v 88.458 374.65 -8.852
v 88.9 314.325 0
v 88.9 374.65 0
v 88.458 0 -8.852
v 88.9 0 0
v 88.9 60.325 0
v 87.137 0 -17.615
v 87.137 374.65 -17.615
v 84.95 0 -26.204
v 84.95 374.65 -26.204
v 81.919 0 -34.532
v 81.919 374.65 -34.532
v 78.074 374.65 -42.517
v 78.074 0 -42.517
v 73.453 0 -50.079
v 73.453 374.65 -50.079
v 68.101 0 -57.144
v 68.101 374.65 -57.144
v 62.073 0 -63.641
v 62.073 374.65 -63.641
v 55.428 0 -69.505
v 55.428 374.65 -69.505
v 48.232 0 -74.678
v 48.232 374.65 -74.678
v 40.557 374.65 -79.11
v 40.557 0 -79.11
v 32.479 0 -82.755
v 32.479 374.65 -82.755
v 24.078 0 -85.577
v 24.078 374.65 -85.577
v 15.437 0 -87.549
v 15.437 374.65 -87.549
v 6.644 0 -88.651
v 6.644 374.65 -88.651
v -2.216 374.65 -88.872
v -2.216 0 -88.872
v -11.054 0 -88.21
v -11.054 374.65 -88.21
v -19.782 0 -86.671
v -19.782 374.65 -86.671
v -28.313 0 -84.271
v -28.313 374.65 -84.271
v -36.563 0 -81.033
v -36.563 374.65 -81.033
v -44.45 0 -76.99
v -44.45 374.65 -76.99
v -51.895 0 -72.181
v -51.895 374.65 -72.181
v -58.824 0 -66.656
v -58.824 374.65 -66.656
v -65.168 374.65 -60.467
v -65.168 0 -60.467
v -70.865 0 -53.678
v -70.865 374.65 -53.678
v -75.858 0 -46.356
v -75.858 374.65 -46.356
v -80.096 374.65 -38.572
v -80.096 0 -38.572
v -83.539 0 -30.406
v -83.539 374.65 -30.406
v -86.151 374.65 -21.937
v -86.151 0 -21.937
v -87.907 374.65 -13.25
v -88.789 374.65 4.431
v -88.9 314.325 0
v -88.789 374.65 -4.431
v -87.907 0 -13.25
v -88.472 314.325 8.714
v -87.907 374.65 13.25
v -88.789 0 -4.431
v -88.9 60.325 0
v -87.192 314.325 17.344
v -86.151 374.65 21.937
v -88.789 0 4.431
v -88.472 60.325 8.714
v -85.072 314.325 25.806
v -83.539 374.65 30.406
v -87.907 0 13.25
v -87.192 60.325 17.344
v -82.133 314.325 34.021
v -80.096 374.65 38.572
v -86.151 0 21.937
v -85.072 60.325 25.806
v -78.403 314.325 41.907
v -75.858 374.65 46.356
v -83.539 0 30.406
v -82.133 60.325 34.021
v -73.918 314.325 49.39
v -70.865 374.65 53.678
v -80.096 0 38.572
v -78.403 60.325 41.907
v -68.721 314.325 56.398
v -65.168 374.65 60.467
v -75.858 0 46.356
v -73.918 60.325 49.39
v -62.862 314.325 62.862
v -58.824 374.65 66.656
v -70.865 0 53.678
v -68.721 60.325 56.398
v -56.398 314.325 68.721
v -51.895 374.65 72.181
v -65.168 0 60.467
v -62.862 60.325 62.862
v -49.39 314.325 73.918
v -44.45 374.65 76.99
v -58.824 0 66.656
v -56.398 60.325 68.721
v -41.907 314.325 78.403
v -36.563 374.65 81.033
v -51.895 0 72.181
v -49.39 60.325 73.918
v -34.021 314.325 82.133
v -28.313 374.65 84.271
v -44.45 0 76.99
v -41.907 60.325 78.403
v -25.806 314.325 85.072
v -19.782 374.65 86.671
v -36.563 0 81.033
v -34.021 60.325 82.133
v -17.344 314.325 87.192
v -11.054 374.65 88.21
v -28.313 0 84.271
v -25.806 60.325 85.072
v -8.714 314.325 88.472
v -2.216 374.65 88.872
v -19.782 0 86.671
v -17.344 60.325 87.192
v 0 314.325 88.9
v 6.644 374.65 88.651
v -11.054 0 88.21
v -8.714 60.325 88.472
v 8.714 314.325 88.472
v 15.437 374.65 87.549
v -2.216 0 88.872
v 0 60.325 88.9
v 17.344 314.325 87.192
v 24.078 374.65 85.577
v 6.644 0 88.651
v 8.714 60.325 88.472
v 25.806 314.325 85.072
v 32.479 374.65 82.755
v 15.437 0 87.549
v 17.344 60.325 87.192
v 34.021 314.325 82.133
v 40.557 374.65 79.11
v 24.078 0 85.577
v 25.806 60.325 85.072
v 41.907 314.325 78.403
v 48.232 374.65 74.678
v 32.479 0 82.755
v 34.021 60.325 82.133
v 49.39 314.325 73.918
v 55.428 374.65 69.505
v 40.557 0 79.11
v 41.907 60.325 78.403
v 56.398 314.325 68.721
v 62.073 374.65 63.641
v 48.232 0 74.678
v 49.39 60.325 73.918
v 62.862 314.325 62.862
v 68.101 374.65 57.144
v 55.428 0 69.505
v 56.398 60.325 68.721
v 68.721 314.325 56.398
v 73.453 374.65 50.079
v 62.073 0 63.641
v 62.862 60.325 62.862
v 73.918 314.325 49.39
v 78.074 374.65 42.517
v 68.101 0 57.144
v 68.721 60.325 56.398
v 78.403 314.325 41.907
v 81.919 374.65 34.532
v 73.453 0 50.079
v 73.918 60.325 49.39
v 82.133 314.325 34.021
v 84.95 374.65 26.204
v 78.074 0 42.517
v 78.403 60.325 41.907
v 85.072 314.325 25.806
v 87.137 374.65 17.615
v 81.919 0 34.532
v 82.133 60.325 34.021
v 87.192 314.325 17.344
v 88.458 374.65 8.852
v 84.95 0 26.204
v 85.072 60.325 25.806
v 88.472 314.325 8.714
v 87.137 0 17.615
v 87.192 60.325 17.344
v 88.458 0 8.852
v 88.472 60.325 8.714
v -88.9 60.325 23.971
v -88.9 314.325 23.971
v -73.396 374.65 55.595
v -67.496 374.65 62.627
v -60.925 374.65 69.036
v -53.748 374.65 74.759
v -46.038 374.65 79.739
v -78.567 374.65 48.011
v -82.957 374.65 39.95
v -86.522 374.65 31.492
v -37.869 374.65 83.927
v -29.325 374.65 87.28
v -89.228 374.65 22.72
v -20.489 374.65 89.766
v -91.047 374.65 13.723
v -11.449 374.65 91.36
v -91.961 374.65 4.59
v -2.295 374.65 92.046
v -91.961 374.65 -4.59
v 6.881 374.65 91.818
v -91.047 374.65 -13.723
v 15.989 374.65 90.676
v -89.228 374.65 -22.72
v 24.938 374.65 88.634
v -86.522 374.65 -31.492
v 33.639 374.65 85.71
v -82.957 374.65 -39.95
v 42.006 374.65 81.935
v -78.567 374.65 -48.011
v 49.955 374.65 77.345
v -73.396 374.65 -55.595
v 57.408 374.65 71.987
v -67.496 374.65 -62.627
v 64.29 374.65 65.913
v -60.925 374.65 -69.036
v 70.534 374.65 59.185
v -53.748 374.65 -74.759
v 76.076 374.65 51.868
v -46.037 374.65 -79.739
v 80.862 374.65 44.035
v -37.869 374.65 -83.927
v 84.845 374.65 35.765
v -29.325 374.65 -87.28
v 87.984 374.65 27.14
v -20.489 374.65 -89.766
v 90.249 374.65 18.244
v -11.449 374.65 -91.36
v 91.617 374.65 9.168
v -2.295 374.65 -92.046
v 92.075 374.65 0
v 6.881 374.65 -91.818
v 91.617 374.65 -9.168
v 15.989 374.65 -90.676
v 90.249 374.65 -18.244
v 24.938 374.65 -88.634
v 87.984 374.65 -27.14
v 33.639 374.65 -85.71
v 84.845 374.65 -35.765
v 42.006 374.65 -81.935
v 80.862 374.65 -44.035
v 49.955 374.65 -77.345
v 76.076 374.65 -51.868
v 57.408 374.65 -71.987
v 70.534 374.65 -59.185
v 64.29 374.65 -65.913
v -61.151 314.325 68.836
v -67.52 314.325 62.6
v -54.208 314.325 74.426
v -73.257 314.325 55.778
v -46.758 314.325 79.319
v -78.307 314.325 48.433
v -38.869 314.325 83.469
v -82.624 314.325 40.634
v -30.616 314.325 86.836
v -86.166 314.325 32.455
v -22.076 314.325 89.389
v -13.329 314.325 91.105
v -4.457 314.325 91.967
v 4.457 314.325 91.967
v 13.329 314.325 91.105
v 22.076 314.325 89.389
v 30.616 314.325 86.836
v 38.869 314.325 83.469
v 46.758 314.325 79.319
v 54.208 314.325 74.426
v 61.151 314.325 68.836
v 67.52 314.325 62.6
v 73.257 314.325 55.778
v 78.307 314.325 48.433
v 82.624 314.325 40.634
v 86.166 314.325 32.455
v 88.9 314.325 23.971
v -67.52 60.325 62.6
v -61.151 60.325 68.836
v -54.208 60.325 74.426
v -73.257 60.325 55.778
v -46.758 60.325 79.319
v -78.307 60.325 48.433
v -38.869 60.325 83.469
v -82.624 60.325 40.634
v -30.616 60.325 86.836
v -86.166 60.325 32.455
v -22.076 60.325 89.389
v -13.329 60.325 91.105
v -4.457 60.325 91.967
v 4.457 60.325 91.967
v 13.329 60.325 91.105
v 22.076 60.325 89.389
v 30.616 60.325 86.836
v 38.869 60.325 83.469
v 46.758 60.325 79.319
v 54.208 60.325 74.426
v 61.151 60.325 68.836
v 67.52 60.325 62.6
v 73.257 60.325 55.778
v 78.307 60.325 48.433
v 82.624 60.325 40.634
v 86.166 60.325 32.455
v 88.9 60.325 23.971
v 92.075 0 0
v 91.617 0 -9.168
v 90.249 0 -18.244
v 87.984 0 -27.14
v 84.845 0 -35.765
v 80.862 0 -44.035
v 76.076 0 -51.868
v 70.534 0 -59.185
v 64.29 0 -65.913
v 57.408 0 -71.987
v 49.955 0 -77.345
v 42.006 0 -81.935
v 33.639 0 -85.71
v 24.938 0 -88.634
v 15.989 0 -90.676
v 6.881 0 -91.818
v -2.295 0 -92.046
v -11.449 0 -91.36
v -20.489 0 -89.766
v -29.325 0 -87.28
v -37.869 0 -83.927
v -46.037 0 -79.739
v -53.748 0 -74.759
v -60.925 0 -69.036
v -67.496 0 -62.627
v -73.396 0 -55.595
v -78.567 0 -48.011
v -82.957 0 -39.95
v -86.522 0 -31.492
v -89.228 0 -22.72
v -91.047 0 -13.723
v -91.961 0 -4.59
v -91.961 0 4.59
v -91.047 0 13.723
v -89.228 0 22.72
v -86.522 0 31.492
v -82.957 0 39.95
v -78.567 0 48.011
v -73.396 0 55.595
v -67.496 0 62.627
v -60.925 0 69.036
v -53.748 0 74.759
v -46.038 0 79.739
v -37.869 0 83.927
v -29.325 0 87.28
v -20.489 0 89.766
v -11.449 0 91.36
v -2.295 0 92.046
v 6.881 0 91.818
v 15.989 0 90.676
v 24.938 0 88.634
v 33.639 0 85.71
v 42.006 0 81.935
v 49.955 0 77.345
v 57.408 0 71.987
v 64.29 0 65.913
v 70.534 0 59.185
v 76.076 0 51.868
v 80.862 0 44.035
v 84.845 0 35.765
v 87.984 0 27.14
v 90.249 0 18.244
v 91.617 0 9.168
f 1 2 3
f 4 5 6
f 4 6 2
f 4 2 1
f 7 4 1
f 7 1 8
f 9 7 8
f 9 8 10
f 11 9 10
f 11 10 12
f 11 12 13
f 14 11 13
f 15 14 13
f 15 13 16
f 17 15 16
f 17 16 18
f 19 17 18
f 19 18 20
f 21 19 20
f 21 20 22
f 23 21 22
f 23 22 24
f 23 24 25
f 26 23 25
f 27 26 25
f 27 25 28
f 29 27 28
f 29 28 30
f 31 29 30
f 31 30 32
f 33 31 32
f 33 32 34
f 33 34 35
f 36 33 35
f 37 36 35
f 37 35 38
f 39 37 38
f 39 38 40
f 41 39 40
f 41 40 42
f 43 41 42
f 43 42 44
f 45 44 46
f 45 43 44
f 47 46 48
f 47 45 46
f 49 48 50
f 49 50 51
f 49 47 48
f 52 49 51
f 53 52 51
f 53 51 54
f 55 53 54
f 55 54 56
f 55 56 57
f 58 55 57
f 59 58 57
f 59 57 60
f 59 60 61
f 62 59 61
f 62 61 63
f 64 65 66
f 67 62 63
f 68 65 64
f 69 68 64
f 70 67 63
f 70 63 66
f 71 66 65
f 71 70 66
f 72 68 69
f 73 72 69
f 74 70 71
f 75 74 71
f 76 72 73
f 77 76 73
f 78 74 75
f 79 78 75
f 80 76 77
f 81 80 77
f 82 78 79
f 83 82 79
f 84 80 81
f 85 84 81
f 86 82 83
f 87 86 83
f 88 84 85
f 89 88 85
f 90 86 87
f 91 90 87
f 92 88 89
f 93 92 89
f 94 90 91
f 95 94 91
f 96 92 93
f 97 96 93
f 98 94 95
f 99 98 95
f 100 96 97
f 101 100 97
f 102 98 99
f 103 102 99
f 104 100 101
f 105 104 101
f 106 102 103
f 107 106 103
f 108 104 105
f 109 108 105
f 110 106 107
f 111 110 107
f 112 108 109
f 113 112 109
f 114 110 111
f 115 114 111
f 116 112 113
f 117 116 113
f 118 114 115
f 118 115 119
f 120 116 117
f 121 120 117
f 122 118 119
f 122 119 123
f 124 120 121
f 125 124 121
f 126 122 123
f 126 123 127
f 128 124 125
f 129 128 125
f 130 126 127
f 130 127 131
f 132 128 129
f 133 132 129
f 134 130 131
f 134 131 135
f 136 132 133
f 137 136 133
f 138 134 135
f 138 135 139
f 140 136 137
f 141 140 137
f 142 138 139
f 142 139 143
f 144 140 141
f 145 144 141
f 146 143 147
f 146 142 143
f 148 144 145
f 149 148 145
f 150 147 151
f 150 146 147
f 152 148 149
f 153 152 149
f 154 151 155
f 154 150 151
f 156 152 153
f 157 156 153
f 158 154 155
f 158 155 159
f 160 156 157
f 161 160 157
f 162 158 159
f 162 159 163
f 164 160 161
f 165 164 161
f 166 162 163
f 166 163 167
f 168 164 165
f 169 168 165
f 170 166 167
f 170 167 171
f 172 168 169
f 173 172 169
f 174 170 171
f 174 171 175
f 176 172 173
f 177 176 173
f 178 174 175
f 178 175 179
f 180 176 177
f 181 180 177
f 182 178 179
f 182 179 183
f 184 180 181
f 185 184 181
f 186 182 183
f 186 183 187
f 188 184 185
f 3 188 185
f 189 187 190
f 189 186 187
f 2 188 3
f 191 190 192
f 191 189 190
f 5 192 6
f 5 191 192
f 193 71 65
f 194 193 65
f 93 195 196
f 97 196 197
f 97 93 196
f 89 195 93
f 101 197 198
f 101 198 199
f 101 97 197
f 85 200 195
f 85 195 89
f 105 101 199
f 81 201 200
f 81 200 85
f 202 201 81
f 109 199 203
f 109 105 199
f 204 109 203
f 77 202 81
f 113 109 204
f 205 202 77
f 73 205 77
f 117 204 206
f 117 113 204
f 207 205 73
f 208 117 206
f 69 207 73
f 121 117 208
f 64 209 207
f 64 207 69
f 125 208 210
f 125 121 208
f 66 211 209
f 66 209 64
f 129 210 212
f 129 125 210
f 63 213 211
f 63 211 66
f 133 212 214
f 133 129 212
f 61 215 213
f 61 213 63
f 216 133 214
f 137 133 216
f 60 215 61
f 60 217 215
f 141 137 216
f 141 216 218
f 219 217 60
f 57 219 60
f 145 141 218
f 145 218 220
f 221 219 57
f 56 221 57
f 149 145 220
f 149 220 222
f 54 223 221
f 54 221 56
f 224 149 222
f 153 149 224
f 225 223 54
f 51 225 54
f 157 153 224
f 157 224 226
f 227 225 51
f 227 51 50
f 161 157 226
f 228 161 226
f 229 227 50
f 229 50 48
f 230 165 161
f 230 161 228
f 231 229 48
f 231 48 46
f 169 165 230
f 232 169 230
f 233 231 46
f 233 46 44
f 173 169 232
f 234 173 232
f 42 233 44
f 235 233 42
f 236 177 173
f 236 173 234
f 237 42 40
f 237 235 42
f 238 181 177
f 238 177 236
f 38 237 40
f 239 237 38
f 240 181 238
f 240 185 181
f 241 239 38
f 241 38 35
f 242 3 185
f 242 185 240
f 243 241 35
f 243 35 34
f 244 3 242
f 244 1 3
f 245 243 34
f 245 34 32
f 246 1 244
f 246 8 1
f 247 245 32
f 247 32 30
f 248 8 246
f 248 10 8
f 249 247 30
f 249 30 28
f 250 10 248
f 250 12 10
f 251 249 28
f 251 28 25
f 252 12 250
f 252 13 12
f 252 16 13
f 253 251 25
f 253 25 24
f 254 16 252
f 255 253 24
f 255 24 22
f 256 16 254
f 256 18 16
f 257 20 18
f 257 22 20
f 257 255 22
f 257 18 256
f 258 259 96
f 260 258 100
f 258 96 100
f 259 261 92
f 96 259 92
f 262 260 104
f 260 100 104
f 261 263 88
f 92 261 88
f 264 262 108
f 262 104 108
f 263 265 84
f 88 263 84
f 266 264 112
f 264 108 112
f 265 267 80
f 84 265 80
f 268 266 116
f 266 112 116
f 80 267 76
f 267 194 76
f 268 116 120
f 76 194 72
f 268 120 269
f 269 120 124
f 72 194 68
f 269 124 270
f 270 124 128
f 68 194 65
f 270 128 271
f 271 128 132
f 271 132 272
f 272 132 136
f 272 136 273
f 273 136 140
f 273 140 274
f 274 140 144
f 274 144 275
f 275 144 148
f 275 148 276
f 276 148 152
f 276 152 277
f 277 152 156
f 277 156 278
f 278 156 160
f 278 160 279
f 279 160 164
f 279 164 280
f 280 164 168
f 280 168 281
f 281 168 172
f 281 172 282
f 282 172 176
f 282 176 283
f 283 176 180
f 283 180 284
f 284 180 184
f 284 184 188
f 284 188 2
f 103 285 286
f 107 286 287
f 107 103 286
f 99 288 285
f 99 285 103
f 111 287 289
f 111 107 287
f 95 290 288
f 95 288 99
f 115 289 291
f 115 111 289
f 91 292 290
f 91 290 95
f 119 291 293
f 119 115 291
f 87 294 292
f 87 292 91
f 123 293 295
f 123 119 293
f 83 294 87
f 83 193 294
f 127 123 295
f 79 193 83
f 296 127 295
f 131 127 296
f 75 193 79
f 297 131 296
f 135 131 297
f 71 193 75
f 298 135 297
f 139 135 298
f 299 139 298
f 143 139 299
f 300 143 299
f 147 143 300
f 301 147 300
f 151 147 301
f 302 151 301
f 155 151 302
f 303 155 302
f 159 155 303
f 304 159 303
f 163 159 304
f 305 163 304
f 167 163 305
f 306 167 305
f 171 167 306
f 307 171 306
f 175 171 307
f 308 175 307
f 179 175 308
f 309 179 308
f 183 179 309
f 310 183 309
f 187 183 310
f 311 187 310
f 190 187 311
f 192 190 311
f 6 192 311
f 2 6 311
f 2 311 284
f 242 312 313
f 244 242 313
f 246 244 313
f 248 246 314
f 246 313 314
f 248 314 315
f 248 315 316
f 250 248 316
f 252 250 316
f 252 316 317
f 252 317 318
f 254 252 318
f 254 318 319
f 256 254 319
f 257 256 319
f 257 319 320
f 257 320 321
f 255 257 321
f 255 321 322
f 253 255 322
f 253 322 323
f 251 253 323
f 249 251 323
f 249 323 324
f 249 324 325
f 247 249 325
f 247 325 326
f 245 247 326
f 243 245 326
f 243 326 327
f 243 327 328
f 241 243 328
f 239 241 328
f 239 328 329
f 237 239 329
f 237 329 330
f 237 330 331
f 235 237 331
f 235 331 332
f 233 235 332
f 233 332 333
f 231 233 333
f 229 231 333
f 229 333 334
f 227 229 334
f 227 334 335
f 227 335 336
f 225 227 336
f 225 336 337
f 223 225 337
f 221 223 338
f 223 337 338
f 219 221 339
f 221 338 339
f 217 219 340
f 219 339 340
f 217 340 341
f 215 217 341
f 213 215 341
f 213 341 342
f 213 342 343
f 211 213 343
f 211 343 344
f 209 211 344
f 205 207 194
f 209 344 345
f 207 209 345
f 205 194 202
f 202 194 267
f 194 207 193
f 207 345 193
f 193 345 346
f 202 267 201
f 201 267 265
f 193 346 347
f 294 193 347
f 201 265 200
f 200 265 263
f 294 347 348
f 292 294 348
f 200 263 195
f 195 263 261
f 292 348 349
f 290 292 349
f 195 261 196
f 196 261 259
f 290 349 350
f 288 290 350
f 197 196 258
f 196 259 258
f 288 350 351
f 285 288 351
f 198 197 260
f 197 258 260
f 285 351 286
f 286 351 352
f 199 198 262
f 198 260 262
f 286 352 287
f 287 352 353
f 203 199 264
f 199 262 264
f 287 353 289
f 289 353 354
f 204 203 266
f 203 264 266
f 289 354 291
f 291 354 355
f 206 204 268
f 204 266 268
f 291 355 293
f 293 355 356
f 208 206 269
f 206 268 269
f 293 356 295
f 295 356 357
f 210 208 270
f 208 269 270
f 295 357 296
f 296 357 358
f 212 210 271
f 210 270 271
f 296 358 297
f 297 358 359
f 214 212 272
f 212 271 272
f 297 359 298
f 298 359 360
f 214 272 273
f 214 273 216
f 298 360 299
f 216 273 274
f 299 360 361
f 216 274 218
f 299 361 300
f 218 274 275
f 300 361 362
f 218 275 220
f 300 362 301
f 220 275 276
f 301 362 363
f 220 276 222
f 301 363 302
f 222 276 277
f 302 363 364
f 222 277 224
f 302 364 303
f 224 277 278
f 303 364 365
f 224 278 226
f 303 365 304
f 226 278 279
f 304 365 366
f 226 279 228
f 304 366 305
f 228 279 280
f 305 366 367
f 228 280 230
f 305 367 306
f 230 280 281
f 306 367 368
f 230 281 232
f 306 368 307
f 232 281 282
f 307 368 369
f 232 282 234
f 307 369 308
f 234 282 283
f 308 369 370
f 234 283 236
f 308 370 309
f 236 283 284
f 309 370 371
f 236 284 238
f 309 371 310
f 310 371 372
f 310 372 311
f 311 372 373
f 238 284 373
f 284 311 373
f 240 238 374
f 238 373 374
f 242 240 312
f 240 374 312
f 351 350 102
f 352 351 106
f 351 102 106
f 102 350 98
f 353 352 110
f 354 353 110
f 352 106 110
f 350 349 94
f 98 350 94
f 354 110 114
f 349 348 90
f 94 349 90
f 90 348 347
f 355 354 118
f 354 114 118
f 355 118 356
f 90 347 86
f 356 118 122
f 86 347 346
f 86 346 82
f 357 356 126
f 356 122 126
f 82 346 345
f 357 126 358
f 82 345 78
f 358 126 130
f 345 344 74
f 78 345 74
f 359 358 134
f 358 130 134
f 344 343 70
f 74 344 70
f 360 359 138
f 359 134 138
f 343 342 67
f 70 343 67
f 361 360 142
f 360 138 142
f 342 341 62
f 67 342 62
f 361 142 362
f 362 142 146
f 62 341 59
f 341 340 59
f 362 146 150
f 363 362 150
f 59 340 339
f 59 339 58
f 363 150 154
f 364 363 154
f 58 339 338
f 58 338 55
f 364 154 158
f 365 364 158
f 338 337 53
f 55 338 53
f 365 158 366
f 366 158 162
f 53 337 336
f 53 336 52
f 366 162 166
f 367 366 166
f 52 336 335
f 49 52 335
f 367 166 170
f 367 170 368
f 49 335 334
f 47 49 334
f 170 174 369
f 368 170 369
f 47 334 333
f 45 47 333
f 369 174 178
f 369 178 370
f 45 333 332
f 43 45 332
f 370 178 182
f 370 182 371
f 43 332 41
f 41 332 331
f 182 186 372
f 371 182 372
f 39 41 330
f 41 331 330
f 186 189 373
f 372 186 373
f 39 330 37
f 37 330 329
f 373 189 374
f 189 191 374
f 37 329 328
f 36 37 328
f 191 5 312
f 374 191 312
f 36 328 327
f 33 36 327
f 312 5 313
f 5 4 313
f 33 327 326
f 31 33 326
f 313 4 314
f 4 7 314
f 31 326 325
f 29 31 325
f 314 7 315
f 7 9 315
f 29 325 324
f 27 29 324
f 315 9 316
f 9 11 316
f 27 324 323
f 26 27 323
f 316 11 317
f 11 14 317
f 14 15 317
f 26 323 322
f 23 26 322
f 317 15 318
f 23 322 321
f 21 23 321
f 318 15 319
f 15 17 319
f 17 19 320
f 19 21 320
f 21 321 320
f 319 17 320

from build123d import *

# Parameters (mm, degrees)
SKETCH1_R           = 92.075
SKETCH1_R_2         = 88.9
BOSS_EXTRUDE1_DEPTH = 374.65
SKETCH2_W           = 177.8
SKETCH2_H           = 254
CUT_EXTRUDE1_DEPTH  = 93.075


with BuildPart() as part:
    # Sketch1 → Boss-Extrude1 (new body)
    with BuildSketch(Plane(origin=(0, 0, 0), x_dir=(1, 0, 0), z_dir=(0, 1, 0))):
        Circle(SKETCH1_R)
        Circle(SKETCH1_R_2, mode=Mode.SUBTRACT)
    extrude(amount=BOSS_EXTRUDE1_DEPTH)

    # Sketch2 → Cut-Extrude1 (cut, through all)
    with BuildSketch(Plane.XY):
        with Locations((0, 187.325)):
            Rectangle(SKETCH2_W, SKETCH2_H)
    extrude(amount=CUT_EXTRUDE1_DEPTH, mode=Mode.SUBTRACT)


solid = part.part
